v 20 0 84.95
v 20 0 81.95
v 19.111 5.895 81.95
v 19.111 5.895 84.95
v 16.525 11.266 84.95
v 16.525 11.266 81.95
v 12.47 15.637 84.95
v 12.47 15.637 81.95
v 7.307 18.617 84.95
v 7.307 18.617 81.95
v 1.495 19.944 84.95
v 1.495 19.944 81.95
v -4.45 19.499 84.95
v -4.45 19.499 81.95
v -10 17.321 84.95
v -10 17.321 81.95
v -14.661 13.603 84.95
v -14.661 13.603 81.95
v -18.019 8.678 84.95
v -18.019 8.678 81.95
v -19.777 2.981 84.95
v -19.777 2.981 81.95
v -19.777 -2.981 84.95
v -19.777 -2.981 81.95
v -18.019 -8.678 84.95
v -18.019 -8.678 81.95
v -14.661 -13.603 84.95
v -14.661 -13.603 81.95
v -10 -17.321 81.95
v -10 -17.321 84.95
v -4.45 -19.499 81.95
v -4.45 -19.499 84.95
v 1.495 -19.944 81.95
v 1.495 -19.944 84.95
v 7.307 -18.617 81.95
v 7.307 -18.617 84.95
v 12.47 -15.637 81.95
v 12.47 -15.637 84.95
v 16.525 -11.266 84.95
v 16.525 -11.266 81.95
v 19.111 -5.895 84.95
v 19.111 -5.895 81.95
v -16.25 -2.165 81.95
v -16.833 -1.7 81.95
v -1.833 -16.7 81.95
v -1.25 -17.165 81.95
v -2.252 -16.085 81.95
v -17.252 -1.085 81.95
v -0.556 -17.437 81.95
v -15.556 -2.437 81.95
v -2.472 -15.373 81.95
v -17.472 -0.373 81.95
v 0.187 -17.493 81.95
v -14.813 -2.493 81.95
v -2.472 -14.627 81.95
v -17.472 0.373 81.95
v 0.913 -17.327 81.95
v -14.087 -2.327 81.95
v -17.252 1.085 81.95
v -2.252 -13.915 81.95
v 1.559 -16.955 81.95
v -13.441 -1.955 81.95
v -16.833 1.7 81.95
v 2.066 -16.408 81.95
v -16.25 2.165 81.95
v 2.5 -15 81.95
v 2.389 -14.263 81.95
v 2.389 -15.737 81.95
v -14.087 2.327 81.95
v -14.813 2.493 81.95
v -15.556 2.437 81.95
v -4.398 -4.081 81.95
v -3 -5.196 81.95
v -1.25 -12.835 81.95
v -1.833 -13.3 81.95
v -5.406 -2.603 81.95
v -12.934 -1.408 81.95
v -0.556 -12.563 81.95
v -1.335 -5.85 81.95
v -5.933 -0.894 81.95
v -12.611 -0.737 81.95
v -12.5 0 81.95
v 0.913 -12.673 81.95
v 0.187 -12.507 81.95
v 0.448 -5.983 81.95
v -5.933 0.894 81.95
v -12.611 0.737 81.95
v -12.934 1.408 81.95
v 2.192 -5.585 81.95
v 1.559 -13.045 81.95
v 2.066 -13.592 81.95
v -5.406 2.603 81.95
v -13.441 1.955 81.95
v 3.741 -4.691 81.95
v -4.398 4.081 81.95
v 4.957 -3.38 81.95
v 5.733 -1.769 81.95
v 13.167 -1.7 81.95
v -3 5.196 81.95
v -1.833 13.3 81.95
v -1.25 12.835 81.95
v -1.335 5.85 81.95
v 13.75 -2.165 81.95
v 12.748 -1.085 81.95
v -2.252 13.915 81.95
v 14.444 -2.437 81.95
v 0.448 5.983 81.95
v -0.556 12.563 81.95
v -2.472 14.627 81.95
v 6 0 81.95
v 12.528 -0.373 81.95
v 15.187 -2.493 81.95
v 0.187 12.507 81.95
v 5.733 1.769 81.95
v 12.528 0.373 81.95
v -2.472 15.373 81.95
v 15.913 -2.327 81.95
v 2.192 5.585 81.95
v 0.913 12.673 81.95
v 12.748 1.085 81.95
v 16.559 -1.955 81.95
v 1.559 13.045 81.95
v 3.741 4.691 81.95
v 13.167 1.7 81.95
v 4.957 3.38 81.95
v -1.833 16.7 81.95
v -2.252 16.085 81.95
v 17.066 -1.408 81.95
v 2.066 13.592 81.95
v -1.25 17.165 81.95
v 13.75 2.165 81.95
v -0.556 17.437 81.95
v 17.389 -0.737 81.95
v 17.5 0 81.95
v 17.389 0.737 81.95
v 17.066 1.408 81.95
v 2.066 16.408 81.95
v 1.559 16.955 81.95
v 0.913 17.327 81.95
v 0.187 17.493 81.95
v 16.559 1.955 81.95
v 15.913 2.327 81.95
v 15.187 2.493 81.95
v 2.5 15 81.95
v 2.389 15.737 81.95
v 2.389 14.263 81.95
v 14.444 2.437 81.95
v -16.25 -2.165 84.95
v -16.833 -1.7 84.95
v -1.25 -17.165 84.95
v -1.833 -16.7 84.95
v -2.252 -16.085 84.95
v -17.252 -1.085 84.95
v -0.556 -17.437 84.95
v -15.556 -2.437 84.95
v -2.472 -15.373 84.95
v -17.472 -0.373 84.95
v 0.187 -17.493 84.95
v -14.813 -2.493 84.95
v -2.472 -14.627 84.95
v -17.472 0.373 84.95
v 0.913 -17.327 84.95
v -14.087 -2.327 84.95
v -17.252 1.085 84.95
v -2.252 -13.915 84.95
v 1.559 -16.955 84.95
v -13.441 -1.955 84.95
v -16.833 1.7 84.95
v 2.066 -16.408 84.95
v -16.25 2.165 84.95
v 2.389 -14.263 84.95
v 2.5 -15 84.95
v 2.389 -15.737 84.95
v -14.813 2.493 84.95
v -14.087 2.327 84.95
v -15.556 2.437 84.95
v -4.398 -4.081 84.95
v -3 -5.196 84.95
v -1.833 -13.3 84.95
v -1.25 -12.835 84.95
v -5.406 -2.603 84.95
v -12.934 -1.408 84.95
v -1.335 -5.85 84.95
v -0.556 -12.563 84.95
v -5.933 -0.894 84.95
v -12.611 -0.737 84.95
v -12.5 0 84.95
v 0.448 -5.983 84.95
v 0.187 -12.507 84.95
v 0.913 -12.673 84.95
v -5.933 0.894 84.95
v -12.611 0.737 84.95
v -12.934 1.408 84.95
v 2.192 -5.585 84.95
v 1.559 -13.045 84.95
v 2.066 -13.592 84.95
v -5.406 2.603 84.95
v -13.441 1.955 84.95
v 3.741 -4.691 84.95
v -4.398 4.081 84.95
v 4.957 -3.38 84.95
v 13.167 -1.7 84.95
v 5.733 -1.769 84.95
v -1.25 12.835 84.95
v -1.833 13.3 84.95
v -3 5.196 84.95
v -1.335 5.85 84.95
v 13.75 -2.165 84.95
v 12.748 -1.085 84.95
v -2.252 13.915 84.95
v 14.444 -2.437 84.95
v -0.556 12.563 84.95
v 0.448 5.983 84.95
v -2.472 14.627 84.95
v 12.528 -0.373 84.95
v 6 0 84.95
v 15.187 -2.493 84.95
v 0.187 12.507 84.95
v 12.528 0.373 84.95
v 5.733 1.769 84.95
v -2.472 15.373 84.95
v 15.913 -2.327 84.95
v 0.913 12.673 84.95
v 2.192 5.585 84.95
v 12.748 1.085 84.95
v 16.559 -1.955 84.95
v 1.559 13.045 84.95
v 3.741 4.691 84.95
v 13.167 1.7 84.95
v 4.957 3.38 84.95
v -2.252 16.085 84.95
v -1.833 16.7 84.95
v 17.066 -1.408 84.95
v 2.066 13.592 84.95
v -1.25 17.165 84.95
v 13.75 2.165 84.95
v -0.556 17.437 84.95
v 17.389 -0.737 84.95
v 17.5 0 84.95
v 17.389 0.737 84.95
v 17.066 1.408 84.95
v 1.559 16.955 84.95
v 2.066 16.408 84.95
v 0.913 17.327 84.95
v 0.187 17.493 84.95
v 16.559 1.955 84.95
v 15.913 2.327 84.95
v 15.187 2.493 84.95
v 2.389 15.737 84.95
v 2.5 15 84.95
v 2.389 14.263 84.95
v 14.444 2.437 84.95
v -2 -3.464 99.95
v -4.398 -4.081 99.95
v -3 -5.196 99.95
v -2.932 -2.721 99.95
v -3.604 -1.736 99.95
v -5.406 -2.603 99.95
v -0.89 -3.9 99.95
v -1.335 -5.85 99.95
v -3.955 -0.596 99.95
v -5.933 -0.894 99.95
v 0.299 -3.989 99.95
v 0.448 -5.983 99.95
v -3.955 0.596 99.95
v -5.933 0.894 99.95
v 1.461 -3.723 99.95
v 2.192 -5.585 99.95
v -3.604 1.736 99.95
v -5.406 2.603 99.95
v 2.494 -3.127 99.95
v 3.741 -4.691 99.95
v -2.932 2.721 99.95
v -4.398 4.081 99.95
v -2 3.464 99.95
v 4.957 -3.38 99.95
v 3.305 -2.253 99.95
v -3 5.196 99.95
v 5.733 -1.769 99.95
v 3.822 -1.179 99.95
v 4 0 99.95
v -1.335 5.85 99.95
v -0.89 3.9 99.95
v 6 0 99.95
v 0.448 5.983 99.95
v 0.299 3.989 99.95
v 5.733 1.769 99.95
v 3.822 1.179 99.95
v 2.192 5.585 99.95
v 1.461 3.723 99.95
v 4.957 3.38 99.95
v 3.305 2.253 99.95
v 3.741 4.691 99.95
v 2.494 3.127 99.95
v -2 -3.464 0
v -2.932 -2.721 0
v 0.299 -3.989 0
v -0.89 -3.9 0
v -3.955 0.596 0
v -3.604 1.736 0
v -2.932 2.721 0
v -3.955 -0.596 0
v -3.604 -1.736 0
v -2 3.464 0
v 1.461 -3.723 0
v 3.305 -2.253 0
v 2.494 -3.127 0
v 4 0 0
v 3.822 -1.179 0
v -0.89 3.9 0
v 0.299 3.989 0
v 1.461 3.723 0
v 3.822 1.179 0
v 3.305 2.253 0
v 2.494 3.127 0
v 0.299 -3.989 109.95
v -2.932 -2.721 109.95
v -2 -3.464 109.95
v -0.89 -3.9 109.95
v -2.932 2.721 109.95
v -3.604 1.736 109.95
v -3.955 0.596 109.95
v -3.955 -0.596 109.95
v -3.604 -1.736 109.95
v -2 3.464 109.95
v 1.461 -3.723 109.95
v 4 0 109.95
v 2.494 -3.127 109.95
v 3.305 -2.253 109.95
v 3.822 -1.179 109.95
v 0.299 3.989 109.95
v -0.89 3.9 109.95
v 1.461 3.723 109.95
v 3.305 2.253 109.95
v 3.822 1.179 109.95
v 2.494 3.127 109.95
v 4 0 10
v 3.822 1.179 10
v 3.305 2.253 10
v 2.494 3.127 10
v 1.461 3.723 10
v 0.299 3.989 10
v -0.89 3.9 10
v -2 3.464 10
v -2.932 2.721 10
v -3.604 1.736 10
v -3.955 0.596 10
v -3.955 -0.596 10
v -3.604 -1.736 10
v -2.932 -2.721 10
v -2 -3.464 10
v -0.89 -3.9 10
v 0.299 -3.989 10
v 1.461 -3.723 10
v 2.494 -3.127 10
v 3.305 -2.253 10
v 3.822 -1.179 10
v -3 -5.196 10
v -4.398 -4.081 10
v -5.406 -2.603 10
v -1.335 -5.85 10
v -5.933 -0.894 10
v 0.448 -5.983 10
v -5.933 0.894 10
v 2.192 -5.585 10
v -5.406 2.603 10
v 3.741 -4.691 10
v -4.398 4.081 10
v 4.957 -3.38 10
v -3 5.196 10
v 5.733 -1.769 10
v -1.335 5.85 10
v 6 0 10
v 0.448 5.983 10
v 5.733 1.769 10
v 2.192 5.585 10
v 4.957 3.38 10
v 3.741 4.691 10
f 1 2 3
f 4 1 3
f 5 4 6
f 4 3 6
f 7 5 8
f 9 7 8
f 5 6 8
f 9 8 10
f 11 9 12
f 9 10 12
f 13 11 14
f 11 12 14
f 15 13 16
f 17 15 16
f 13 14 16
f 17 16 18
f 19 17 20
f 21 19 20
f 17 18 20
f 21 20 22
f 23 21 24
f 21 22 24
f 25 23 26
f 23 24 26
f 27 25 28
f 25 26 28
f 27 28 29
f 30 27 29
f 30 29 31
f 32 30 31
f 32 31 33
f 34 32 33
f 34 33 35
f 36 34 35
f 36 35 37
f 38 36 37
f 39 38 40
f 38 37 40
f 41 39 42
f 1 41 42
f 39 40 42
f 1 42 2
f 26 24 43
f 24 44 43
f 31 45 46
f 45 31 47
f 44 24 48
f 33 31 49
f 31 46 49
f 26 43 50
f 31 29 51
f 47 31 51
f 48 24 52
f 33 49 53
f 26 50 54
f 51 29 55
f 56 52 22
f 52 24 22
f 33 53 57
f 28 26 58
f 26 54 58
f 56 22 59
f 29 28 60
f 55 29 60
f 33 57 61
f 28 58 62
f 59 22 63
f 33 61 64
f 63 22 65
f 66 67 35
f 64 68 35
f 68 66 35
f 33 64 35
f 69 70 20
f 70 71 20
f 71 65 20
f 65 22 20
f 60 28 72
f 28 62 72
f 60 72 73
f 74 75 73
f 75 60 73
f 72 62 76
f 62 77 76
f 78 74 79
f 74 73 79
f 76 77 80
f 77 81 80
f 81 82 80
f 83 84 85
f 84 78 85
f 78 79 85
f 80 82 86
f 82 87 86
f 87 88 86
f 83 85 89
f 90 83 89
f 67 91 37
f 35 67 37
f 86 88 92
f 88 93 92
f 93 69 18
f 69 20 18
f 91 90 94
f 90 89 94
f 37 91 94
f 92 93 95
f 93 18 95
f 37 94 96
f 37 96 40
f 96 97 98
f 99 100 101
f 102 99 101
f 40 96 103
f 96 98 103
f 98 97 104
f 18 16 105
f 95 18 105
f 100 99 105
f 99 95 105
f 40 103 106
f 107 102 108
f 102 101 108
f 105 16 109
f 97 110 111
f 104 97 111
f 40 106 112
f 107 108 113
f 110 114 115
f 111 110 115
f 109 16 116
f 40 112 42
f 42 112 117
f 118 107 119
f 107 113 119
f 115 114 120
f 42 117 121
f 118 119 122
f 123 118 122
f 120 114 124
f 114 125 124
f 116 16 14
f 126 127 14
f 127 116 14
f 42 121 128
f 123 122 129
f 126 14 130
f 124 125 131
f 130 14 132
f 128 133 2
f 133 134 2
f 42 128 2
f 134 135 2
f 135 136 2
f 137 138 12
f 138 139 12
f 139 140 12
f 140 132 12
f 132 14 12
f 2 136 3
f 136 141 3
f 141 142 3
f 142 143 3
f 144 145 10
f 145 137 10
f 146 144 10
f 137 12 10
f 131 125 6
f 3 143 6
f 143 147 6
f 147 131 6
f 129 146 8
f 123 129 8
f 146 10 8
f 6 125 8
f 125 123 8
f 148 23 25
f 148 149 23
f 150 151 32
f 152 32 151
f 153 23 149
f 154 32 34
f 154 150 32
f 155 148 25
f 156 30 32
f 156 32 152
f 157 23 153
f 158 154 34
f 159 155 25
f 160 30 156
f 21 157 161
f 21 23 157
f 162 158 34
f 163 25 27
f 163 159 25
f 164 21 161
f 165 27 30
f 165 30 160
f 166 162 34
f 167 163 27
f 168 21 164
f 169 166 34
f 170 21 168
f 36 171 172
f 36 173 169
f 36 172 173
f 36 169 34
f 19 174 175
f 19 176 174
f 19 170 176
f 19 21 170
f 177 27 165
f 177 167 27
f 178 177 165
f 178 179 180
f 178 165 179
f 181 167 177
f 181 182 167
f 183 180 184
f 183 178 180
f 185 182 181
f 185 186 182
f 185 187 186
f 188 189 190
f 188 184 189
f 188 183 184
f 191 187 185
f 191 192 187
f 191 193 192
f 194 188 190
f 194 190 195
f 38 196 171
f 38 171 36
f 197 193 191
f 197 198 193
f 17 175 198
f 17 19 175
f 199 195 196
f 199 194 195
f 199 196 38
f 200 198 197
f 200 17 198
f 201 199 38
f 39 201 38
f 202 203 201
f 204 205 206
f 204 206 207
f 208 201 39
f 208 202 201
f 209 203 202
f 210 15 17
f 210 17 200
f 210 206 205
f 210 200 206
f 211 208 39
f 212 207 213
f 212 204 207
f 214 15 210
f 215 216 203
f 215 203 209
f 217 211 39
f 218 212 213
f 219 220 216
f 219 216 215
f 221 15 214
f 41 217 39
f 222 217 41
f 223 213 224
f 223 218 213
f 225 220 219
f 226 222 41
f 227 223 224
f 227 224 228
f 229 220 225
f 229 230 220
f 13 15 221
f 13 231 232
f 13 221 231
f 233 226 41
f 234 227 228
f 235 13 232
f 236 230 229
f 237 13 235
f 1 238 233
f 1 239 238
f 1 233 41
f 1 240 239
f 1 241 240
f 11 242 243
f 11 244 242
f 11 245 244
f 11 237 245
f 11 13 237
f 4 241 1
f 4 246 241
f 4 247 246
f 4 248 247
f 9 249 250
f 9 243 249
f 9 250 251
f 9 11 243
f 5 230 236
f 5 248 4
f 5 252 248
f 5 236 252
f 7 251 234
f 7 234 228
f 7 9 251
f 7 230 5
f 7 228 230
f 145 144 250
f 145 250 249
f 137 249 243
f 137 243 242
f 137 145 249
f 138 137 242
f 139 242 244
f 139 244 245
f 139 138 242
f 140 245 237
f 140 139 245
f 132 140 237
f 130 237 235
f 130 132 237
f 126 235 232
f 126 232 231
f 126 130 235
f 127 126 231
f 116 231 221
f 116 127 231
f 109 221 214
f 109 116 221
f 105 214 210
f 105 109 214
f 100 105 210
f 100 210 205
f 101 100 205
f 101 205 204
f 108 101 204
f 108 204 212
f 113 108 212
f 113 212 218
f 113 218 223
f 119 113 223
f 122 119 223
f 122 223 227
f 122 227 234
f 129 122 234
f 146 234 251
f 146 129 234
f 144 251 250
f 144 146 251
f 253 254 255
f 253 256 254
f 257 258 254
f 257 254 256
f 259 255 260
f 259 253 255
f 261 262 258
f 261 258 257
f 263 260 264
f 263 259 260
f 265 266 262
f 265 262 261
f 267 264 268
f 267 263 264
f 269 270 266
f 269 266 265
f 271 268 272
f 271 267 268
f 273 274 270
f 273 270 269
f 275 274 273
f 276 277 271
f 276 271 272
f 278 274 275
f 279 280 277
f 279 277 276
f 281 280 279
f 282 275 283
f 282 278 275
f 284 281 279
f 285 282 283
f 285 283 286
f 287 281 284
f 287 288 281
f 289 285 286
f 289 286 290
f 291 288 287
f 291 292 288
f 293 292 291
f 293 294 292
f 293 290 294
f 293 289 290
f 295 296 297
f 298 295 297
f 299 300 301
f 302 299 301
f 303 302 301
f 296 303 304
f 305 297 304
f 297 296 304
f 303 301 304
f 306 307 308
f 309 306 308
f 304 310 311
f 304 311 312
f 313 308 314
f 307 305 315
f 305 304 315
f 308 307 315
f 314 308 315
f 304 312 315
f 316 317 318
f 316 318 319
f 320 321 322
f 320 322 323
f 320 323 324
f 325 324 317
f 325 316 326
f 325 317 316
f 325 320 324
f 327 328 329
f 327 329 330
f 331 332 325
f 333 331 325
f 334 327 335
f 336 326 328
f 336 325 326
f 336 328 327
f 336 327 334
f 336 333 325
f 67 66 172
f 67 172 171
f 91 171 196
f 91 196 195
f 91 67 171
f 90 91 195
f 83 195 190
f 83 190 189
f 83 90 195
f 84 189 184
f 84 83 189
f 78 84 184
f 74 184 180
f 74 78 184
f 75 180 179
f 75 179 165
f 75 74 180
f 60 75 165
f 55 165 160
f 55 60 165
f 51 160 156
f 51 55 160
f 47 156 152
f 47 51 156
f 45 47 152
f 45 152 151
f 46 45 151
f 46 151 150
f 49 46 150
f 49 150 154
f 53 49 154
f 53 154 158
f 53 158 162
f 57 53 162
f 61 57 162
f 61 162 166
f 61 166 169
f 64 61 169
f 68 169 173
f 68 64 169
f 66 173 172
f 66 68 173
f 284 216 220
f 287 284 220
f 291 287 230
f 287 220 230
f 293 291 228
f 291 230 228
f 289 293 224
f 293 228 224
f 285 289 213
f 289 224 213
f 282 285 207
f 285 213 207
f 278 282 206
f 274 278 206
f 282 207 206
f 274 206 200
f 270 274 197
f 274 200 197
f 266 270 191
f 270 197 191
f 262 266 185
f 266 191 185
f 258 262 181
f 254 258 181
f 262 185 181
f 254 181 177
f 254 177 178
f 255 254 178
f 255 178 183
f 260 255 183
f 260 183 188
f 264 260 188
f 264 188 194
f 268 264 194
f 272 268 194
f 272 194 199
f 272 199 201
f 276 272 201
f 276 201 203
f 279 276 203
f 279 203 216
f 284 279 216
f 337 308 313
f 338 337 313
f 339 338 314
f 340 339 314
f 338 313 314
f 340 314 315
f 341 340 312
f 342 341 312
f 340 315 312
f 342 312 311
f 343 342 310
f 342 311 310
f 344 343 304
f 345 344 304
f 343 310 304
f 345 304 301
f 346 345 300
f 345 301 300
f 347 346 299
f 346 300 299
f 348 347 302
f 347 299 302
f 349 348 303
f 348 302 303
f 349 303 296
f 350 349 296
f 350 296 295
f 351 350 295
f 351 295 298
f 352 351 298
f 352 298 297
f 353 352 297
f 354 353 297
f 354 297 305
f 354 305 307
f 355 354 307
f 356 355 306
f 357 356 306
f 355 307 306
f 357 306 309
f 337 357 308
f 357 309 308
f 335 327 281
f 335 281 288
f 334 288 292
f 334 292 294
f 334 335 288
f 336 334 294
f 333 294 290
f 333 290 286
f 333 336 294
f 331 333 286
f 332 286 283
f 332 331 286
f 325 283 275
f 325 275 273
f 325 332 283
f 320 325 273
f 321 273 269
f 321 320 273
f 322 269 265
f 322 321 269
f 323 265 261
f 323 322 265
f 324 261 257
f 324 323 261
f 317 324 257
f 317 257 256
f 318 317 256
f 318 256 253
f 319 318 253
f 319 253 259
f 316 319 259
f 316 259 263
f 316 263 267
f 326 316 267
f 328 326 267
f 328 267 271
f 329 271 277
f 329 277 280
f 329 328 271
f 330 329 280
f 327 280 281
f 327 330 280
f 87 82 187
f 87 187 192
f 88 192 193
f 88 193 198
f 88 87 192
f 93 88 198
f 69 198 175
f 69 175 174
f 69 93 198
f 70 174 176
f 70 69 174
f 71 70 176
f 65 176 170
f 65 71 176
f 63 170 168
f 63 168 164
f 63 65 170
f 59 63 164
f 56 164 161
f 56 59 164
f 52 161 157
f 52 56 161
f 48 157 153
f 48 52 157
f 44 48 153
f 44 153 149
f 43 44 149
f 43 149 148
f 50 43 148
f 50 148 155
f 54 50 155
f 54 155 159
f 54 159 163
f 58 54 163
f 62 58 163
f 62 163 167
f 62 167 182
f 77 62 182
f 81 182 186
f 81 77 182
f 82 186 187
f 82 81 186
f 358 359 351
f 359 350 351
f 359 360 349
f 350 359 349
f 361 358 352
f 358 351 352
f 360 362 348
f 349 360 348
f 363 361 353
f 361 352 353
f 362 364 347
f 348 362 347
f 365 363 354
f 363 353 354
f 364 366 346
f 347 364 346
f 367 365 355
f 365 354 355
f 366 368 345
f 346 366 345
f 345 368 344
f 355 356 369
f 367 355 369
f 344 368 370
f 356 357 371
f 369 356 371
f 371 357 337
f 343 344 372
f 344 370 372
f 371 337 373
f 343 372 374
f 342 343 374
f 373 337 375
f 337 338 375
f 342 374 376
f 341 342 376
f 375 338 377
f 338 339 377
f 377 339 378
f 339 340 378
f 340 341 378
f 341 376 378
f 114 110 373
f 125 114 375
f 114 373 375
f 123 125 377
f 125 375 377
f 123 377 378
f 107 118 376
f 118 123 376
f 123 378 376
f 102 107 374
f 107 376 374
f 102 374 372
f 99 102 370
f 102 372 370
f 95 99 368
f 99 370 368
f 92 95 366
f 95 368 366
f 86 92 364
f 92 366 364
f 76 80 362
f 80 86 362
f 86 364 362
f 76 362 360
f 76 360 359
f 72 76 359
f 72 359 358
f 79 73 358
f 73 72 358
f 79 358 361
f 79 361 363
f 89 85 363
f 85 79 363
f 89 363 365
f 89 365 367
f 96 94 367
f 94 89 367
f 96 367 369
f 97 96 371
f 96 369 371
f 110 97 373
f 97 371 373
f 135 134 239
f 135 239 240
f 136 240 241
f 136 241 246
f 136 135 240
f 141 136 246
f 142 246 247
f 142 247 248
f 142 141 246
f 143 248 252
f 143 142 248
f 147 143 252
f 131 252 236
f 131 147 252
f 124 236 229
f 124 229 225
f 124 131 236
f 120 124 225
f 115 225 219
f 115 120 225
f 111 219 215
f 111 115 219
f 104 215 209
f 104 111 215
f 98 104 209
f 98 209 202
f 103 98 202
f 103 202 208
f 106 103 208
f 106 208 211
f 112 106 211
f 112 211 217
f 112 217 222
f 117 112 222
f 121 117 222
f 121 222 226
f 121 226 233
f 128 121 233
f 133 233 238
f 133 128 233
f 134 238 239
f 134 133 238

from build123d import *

# Parameters (mm, degrees)
SKETCH1_R           = 6
BOSS_EXTRUDE1_DEPTH = 109.95
SKETCH2_R           = 20
SKETCH2_R_2         = 2.5
BOSS_EXTRUDE2_DEPTH = 3
SKETCH3_R           = 6
SKETCH3_R_2         = 4
CUT_EXTRUDE1_DEPTH  = 10


with BuildPart() as part:
    # Sketch1 → Boss-Extrude1 (new body)
    with BuildSketch(Plane.XY):
        Circle(SKETCH1_R)
    extrude(amount=BOSS_EXTRUDE1_DEPTH)

    # Sketch2 → Boss-Extrude2 (add)
    with BuildSketch(Plane.XY.offset(81.95)):
        Circle(SKETCH2_R)
        with Locations((0, 15)):
            Circle(SKETCH2_R_2, mode=Mode.SUBTRACT)
        with Locations((15, 0)):
            Circle(SKETCH2_R_2, mode=Mode.SUBTRACT)
        with Locations((0, -15)):
            Circle(SKETCH2_R_2, mode=Mode.SUBTRACT)
        with Locations((-15, 0)):
            Circle(SKETCH2_R_2, mode=Mode.SUBTRACT)
    extrude(amount=BOSS_EXTRUDE2_DEPTH)

    # Sketch3 → Cut-Extrude1 (cut)
    with BuildSketch(Plane.XY.offset(109.95)):
        Circle(SKETCH3_R)
        Circle(SKETCH3_R_2, mode=Mode.SUBTRACT)
    cut_extrude1 = extrude(amount=-CUT_EXTRUDE1_DEPTH, mode=Mode.SUBTRACT)

    # Mirror1: Cut-Extrude1 across plane
    add(cut_extrude1.mirror(Plane.XY.offset(54.975)), mode=Mode.SUBTRACT)


solid = part.part
